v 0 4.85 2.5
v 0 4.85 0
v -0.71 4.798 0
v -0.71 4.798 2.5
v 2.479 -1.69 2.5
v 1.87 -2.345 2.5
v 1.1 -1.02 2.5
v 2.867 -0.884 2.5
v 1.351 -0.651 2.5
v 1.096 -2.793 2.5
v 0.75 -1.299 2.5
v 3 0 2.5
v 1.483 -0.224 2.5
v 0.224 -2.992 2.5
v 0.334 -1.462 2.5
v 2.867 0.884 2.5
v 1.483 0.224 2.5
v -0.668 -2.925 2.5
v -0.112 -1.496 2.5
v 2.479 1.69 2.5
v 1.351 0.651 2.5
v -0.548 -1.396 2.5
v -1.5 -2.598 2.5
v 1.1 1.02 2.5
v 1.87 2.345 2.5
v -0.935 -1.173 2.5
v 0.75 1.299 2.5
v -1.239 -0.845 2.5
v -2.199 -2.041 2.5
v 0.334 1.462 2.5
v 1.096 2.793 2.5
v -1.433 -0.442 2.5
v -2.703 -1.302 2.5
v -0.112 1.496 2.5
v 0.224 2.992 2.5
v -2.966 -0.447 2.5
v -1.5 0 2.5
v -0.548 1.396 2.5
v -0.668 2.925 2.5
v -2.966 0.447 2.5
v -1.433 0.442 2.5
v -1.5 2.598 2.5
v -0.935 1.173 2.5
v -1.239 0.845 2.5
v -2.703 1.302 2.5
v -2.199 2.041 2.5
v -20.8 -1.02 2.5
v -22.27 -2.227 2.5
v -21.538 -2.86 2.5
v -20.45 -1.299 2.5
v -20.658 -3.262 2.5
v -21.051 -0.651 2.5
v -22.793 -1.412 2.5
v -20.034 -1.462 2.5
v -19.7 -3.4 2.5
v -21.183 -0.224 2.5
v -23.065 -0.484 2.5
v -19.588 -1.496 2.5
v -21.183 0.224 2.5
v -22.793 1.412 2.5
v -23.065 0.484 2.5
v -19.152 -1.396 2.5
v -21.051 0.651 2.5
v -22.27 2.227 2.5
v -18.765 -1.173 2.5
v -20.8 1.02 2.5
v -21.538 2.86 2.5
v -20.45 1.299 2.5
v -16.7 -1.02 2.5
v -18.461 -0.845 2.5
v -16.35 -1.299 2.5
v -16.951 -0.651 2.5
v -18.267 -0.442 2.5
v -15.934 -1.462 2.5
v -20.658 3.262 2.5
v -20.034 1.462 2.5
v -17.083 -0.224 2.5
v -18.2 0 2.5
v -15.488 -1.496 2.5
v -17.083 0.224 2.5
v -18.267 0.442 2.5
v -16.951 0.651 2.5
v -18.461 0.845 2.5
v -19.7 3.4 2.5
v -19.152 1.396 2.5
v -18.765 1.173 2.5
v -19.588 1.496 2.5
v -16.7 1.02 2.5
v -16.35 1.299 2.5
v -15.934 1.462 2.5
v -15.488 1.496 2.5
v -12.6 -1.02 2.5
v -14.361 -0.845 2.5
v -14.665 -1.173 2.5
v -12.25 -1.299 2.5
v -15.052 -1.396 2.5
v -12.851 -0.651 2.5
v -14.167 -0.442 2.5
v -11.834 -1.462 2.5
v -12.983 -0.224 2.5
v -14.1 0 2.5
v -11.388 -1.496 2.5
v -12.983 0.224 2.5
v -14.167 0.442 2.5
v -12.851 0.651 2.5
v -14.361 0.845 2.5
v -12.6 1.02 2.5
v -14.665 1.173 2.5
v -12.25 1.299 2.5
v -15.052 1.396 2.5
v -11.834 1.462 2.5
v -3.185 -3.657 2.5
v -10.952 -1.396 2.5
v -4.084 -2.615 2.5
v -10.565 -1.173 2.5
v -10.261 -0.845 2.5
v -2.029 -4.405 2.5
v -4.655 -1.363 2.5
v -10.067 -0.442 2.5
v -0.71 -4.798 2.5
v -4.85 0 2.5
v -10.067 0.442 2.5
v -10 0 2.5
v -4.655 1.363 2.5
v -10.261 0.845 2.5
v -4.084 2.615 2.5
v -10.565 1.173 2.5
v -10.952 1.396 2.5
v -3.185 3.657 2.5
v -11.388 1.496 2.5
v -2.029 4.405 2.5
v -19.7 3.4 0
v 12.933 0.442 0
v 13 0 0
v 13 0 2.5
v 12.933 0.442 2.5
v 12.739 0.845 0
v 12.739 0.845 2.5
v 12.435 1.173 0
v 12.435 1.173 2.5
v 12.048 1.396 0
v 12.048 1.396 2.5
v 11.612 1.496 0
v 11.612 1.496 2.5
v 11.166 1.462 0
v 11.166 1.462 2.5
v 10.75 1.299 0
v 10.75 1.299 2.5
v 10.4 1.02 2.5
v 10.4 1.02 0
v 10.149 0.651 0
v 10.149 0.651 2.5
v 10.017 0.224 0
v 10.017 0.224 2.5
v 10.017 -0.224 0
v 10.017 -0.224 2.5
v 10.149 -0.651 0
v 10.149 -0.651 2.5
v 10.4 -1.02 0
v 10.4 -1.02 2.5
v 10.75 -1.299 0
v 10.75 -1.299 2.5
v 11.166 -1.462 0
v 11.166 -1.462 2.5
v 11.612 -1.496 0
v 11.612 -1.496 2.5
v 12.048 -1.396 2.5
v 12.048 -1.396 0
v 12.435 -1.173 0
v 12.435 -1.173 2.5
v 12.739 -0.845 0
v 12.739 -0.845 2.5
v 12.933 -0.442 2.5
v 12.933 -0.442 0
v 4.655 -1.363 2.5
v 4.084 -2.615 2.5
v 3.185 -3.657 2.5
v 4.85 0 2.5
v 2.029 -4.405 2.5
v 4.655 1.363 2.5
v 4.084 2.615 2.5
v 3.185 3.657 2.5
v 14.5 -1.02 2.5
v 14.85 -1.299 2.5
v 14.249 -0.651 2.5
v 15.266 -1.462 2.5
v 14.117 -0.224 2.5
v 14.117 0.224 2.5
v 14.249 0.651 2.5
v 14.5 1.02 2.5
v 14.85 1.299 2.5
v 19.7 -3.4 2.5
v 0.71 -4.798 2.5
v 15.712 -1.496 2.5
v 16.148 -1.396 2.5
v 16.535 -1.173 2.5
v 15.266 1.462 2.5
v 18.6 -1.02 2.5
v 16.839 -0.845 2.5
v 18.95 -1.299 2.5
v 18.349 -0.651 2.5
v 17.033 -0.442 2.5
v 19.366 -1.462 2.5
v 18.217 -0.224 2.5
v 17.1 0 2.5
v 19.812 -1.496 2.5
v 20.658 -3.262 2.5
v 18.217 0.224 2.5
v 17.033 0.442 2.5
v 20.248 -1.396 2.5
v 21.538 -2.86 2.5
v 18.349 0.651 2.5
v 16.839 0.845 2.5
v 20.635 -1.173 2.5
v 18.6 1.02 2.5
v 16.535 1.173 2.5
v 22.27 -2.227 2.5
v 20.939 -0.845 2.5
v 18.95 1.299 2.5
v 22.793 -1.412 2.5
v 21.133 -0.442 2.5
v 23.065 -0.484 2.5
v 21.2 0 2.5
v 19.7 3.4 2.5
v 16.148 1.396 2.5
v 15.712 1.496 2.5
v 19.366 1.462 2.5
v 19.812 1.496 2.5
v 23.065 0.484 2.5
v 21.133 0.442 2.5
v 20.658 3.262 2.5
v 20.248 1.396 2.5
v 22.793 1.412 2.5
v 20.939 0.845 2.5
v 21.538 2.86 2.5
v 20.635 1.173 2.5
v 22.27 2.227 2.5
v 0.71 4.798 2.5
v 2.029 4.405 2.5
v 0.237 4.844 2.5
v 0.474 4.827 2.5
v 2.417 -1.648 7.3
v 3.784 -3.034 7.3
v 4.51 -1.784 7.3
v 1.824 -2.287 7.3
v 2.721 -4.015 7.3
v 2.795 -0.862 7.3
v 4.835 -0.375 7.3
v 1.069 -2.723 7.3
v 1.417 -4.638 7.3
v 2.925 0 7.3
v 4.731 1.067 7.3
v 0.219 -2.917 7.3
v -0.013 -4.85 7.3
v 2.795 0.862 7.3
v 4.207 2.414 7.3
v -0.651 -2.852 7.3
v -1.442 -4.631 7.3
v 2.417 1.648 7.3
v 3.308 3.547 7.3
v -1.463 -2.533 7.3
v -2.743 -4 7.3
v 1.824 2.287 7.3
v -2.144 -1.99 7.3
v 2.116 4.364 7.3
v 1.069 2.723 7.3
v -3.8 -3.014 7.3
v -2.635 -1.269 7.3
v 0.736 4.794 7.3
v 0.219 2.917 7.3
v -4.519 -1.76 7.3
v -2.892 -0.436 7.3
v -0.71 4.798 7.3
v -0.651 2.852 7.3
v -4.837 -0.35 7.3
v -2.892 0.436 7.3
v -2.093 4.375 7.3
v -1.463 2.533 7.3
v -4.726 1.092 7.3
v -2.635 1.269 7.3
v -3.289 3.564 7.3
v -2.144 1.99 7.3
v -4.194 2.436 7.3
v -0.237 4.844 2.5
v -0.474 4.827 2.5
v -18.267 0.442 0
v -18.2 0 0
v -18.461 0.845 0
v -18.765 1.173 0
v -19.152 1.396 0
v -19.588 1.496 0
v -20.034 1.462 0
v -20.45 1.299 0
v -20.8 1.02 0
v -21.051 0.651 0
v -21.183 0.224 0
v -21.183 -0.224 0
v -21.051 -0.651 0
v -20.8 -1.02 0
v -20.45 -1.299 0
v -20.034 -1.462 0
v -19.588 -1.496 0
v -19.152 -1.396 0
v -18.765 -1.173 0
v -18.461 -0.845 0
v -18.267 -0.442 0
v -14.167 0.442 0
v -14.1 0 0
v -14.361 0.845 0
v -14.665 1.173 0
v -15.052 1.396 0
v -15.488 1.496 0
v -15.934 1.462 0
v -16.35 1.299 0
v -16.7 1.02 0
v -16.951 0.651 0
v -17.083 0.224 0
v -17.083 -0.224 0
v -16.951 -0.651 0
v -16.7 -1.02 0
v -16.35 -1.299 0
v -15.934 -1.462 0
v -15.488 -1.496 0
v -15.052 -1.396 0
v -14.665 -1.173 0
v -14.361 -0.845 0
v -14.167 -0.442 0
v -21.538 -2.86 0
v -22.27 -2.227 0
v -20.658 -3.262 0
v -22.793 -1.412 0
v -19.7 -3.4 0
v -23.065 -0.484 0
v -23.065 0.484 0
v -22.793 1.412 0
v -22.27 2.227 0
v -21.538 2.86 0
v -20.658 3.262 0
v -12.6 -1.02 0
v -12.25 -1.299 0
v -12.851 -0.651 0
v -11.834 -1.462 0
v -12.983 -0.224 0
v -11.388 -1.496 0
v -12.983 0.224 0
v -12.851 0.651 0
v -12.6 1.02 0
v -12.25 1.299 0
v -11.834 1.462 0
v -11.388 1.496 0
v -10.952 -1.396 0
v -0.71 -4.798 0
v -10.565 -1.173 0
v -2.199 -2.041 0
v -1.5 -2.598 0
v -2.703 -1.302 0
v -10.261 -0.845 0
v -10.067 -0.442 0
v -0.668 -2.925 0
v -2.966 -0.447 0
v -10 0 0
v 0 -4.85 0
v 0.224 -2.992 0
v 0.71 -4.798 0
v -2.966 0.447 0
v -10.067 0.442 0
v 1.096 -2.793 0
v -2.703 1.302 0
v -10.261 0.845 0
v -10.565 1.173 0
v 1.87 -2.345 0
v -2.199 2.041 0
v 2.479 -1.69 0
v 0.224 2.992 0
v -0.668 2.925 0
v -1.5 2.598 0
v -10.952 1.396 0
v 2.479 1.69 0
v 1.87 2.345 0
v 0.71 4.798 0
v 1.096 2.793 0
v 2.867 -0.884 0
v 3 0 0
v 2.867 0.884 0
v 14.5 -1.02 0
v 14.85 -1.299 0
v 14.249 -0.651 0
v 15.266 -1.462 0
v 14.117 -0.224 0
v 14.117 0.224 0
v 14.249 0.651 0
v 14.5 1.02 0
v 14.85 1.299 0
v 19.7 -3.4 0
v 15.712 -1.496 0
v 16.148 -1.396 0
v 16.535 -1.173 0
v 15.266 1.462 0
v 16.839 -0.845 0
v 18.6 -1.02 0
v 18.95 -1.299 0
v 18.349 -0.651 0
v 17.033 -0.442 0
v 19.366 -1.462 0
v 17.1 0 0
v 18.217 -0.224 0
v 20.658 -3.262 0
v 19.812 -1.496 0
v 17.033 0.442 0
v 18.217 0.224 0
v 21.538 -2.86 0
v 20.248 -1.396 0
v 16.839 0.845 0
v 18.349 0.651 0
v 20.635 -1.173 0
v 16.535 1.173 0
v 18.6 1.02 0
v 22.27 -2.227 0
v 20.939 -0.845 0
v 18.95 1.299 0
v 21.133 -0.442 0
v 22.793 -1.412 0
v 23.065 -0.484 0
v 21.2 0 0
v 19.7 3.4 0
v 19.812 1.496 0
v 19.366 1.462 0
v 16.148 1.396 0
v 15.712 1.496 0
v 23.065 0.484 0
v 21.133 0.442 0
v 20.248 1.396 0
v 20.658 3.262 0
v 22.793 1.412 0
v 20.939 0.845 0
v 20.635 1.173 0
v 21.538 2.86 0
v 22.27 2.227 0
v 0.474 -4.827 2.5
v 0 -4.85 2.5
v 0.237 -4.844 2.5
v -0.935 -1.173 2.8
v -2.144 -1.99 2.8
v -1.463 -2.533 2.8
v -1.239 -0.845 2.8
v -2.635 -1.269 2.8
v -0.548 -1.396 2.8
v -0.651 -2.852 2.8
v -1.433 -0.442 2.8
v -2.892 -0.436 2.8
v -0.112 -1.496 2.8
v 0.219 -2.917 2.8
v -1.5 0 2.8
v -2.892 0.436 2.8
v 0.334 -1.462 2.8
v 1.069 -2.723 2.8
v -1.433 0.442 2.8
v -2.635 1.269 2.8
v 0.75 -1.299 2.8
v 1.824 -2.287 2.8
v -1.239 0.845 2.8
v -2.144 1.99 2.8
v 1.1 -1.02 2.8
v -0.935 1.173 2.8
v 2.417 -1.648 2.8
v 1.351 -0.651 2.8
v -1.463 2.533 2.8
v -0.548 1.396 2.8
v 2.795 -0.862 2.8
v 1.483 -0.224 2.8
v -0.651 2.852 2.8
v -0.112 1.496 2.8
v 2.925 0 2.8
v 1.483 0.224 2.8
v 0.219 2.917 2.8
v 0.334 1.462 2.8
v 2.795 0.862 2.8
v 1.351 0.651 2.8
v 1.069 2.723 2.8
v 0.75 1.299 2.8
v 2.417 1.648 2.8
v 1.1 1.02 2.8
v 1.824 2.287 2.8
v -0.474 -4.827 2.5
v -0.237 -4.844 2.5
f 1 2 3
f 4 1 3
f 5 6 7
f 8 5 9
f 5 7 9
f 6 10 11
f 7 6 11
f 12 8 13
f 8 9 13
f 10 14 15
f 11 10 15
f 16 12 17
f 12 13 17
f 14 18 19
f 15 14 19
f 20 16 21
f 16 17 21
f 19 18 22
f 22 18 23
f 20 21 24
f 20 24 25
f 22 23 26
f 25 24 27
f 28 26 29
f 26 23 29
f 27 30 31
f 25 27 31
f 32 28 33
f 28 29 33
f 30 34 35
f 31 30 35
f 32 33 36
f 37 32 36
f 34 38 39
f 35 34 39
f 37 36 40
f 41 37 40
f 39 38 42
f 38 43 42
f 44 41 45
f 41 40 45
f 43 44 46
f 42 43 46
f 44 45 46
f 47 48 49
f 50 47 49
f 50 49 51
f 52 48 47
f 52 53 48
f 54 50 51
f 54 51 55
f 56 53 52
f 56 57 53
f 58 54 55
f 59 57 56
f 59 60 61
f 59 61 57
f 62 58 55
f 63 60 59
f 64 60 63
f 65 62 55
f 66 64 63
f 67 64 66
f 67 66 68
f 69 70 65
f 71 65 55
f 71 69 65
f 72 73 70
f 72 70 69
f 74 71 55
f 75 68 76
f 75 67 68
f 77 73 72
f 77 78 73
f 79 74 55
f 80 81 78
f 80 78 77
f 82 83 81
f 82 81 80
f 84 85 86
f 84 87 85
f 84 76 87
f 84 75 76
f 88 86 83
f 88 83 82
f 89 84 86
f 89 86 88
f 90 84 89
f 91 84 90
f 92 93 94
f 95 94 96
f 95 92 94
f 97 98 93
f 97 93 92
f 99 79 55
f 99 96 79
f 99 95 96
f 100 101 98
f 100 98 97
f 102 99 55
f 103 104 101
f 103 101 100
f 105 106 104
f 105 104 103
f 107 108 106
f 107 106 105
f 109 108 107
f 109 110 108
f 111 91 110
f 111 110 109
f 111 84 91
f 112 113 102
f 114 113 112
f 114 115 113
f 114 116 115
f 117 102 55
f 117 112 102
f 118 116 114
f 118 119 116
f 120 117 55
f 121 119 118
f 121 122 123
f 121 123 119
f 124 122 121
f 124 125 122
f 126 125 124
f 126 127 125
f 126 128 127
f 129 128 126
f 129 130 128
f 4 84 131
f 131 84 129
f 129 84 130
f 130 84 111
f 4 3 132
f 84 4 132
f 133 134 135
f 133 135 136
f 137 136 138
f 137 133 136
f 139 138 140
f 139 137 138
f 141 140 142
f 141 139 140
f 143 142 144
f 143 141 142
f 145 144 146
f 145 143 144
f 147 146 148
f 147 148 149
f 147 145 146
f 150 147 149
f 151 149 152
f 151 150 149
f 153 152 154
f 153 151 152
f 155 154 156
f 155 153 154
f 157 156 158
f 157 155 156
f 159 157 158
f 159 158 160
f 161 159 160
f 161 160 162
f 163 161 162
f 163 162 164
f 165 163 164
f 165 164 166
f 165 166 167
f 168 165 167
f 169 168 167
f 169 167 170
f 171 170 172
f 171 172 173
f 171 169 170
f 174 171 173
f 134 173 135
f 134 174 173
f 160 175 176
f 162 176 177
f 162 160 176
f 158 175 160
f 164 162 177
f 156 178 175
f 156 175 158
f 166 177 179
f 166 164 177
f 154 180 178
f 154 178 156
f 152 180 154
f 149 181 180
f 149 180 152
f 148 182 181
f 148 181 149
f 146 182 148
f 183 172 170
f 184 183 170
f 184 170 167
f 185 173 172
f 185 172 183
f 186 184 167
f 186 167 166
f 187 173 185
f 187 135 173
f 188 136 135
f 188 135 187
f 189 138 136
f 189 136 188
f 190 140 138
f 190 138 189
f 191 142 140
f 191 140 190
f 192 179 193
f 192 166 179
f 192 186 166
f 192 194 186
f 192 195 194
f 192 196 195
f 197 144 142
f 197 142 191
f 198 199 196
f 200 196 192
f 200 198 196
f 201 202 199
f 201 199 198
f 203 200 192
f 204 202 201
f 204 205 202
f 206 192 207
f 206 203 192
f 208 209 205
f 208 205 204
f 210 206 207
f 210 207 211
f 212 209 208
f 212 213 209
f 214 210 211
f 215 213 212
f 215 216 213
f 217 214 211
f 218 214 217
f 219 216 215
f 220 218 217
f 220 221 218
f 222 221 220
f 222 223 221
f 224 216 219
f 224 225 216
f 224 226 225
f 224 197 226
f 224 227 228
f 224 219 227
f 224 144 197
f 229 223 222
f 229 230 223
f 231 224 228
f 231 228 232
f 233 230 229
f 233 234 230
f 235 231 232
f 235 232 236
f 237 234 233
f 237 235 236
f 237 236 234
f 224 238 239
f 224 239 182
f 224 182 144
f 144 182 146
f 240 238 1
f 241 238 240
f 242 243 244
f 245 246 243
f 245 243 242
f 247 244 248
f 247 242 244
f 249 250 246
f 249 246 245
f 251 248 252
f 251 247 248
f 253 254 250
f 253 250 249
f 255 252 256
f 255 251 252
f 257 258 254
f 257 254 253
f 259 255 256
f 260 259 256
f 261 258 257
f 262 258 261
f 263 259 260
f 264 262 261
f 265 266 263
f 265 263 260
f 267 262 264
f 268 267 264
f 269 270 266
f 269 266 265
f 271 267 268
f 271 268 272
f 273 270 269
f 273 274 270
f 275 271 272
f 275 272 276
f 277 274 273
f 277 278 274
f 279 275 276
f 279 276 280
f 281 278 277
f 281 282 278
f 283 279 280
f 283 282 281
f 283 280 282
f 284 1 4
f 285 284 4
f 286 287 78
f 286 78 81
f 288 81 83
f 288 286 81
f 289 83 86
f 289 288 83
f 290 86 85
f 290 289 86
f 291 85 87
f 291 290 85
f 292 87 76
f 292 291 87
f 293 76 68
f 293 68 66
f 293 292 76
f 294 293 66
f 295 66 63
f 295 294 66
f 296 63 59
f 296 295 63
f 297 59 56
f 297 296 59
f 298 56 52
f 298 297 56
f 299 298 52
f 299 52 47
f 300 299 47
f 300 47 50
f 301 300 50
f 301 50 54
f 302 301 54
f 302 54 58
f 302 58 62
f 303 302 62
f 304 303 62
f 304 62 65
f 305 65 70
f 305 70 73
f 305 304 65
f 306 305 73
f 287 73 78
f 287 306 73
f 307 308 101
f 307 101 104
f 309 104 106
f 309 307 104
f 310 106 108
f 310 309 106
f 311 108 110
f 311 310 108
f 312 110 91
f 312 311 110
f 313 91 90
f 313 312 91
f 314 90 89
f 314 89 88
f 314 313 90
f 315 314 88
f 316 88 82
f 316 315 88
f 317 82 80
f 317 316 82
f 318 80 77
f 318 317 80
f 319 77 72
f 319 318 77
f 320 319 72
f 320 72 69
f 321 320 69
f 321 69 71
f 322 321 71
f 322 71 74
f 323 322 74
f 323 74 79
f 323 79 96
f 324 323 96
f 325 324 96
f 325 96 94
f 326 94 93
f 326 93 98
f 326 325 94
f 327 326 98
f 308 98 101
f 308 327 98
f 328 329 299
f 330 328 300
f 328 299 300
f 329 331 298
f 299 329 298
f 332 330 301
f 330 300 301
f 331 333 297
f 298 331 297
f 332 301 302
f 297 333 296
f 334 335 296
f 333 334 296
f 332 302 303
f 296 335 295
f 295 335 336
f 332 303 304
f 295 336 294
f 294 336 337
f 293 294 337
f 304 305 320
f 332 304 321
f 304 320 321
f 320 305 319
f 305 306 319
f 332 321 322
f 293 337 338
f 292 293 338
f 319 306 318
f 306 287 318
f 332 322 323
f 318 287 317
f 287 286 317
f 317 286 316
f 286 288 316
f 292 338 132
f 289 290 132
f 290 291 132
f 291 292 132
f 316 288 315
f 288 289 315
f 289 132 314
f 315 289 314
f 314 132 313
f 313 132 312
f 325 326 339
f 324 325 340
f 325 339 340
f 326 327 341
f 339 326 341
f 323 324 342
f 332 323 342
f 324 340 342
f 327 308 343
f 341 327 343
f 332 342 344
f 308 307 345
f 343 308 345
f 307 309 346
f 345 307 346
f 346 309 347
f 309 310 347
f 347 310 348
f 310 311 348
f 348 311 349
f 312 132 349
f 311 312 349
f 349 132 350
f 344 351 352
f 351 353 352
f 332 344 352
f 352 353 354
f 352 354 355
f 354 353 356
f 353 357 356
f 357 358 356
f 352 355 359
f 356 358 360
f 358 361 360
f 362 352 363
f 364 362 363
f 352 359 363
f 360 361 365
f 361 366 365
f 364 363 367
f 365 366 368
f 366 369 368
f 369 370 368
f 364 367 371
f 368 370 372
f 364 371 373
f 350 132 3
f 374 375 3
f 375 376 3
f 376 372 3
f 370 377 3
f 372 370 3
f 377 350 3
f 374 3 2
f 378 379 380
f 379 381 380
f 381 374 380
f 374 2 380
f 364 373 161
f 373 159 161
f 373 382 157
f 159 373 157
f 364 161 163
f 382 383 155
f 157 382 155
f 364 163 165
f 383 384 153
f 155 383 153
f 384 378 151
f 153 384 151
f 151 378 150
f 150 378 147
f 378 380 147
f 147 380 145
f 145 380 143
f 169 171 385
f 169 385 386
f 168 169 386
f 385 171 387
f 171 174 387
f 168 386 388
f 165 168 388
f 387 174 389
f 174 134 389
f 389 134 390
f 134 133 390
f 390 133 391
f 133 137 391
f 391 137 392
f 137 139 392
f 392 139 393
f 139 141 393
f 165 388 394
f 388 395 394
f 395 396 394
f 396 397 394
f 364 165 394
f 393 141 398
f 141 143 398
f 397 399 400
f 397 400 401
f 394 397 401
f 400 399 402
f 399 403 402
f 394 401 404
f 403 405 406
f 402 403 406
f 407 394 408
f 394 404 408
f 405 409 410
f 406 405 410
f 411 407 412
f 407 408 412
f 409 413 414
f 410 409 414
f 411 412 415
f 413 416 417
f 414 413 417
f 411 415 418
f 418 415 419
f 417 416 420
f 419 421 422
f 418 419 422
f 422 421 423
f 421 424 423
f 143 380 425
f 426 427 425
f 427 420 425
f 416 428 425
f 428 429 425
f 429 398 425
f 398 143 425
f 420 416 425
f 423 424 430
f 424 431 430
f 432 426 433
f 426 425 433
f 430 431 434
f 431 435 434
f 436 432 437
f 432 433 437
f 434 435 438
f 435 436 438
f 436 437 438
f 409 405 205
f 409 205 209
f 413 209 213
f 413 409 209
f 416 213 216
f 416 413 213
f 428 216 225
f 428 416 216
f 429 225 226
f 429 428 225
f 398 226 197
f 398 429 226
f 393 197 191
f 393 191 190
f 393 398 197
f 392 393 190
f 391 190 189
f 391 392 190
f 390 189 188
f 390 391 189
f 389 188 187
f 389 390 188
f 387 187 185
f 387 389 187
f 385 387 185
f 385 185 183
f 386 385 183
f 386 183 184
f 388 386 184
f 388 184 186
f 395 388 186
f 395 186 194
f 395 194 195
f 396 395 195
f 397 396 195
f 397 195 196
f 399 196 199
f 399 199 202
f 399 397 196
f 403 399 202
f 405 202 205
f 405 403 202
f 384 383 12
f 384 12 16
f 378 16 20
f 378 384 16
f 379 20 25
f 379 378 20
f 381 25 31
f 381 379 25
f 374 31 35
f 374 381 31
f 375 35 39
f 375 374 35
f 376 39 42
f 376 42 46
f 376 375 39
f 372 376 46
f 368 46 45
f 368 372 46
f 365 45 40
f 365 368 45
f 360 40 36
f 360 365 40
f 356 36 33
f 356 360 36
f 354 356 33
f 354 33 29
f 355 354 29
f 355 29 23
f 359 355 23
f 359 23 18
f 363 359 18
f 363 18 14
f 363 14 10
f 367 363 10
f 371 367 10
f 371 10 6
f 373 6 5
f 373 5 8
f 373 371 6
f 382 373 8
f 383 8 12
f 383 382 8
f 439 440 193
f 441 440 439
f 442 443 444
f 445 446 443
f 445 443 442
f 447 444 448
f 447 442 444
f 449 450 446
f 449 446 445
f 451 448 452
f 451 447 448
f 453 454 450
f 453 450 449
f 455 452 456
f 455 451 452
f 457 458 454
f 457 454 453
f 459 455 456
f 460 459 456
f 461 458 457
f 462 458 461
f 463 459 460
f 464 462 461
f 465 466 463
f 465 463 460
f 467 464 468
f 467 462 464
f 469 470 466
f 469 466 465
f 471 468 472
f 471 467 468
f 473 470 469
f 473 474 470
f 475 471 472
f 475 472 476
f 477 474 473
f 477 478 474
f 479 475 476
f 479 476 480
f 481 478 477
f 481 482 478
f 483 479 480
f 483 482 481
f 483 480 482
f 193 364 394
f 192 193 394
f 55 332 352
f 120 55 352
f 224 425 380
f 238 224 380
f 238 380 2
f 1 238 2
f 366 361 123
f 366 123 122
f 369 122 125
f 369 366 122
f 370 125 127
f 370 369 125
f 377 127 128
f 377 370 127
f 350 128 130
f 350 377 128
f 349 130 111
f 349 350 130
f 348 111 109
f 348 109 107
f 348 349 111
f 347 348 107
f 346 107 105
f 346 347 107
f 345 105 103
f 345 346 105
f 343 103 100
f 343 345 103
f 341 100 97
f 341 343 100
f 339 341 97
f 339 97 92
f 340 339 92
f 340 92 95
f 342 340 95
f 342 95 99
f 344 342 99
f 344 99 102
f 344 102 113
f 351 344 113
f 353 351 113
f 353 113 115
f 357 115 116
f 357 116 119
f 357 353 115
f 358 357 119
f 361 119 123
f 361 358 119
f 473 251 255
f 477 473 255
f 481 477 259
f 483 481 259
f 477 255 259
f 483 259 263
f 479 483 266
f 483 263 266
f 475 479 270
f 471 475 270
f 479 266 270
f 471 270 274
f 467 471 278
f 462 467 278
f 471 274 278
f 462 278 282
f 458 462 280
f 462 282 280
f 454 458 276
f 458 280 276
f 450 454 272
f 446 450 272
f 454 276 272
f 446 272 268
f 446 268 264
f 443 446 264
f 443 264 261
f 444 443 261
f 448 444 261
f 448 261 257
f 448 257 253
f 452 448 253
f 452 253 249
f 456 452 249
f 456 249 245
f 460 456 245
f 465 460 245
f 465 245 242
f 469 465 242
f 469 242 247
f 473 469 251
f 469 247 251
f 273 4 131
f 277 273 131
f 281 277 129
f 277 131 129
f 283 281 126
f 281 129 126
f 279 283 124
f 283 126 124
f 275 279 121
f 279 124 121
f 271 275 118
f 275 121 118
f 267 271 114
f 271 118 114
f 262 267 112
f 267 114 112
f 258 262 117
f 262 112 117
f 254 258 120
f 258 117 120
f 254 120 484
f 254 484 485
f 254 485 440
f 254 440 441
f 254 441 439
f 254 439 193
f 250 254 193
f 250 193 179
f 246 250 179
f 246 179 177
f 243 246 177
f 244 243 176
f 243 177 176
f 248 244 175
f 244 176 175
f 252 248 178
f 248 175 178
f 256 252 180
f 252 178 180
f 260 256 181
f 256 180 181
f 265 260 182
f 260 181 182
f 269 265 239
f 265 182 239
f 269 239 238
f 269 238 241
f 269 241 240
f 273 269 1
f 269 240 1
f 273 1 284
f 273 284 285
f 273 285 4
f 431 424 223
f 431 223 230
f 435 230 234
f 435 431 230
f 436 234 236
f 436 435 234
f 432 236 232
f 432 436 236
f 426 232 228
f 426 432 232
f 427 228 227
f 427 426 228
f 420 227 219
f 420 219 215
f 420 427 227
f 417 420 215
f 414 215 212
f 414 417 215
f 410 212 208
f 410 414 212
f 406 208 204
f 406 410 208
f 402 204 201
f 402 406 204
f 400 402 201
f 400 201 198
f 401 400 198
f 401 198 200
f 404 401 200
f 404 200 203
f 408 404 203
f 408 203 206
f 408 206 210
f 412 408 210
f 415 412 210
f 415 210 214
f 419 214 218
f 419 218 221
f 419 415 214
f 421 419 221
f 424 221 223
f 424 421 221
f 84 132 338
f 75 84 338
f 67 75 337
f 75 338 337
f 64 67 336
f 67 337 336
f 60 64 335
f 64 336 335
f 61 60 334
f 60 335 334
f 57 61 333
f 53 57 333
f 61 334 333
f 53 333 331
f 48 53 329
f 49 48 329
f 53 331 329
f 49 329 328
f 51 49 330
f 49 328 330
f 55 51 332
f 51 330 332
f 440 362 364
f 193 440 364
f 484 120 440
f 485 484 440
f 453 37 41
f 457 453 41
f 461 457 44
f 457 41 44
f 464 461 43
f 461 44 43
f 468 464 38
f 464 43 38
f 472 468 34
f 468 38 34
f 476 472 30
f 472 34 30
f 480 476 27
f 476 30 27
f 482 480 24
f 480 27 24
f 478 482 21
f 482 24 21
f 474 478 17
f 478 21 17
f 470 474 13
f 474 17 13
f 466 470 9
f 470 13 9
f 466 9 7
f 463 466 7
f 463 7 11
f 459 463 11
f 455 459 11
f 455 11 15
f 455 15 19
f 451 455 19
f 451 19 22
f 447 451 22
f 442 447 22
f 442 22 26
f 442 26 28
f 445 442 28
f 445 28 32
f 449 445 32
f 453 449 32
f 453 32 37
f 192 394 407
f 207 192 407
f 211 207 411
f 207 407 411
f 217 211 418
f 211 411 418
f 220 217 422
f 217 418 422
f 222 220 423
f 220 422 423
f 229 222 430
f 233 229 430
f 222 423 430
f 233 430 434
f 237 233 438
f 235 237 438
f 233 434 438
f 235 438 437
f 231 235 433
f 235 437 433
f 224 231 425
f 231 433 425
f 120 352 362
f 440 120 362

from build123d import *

# Parameters (mm, degrees)
SKETCH_1_R          = 1.5
SKETCH_1_R_2        = 3
EXTRUDE_1_DEPTH     = 2.5
SKETCH_2_R          = 4.85
EXTRUDE_2_DEPTH     = 4.8
SKETCH_3_R          = 2.925
CUT_EXTRUDE_1_DEPTH = 4.5
SKETCH_4_R          = 1.5
CUT_EXTRUDE_2_DEPTH = 4.5


with BuildPart() as part:
    # 草图1 → 凸台-拉伸1 (new body)
    # profile 1 of 3: a face of its own
    with BuildSketch(Plane.XY):
        with BuildLine():
            Line((-0.710112316, 4.79773285), (-19.7, 3.4))
            ThreePointArc((-19.7, 3.4), (-23.1, 0), (-19.7, -3.4))
            Line((-19.7, -3.4), (-0.710112316, -4.79773285))
            ThreePointArc((-0.710112316, -4.79773285), (-4.85, 0), (-0.710112316, 4.79773285))
        make_face()
        with Locations((-19.7, 0)):
            Circle(SKETCH_1_R, mode=Mode.SUBTRACT)
        with Locations((-15.6, 0)):
            Circle(SKETCH_1_R, mode=Mode.SUBTRACT)
        with Locations((-11.5, 0)):
            Circle(SKETCH_1_R, mode=Mode.SUBTRACT)
    # profile 2 of 3: a face of its own
    with BuildSketch(Plane.XY):
        with BuildLine():
            Line((19.7, 3.4), (0.710112316, 4.79773285))
            ThreePointArc((0.710112316, 4.79773285), (3.671957566, 3.168474023), (4.85, 0))
            ThreePointArc((4.85, 0), (3.671957566, -3.168474023), (0.710112316, -4.79773285))
            Line((0.710112316, -4.79773285), (19.7, -3.4))
            ThreePointArc((19.7, -3.4), (23.1, 0), (19.7, 3.4))
        make_face()
        with Locations((11.5, 0)):
            Circle(SKETCH_1_R, mode=Mode.SUBTRACT)
        with Locations((15.6, 0)):
            Circle(SKETCH_1_R, mode=Mode.SUBTRACT)
        with Locations((19.7, 0)):
            Circle(SKETCH_1_R, mode=Mode.SUBTRACT)
    # profile 3 of 3: a face of its own
    with BuildSketch(Plane.XY):
        with BuildLine():
            Line((0, 4.85), (-0.710112316, 4.79773285))
            ThreePointArc((-0.710112316, 4.79773285), (-4.85, 0), (-0.710112316, -4.79773285))
            Line((-0.710112316, -4.79773285), (0, -4.85))
            Line((0, -4.85), (0.710112316, -4.79773285))
            ThreePointArc((0.710112316, -4.79773285), (3.671957566, -3.168474023), (4.85, 0))
            ThreePointArc((4.85, 0), (3.671957566, 3.168474023), (0.710112316, 4.79773285))
            Line((0.710112316, 4.79773285), (0, 4.85))
        make_face()
        Circle(SKETCH_1_R_2, mode=Mode.SUBTRACT)
    extrude(amount=EXTRUDE_1_DEPTH)

    # 草图2 → 凸台-拉伸2 (add)
    with BuildSketch(Plane.XY.offset(2.5)):
        with Locations(Location((0, 0, 0), (0, 0, 98.419222119))):
            Circle(SKETCH_2_R)
    extrude(amount=EXTRUDE_2_DEPTH)

    # 草图3 → 切除-拉伸1 (cut)
    with BuildSketch(Plane.XY.offset(7.3)):
        Circle(SKETCH_3_R)
    extrude(amount=-CUT_EXTRUDE_1_DEPTH, mode=Mode.SUBTRACT)

    # 草图4 → 切除-拉伸2 (cut)
    with BuildSketch(Plane(origin=(0, 0, 2.5), x_dir=(-1, 0, 0), z_dir=(0, 0, -1))):
        Circle(SKETCH_4_R)
    extrude(amount=-CUT_EXTRUDE_2_DEPTH, mode=Mode.SUBTRACT)


solid = part.part
